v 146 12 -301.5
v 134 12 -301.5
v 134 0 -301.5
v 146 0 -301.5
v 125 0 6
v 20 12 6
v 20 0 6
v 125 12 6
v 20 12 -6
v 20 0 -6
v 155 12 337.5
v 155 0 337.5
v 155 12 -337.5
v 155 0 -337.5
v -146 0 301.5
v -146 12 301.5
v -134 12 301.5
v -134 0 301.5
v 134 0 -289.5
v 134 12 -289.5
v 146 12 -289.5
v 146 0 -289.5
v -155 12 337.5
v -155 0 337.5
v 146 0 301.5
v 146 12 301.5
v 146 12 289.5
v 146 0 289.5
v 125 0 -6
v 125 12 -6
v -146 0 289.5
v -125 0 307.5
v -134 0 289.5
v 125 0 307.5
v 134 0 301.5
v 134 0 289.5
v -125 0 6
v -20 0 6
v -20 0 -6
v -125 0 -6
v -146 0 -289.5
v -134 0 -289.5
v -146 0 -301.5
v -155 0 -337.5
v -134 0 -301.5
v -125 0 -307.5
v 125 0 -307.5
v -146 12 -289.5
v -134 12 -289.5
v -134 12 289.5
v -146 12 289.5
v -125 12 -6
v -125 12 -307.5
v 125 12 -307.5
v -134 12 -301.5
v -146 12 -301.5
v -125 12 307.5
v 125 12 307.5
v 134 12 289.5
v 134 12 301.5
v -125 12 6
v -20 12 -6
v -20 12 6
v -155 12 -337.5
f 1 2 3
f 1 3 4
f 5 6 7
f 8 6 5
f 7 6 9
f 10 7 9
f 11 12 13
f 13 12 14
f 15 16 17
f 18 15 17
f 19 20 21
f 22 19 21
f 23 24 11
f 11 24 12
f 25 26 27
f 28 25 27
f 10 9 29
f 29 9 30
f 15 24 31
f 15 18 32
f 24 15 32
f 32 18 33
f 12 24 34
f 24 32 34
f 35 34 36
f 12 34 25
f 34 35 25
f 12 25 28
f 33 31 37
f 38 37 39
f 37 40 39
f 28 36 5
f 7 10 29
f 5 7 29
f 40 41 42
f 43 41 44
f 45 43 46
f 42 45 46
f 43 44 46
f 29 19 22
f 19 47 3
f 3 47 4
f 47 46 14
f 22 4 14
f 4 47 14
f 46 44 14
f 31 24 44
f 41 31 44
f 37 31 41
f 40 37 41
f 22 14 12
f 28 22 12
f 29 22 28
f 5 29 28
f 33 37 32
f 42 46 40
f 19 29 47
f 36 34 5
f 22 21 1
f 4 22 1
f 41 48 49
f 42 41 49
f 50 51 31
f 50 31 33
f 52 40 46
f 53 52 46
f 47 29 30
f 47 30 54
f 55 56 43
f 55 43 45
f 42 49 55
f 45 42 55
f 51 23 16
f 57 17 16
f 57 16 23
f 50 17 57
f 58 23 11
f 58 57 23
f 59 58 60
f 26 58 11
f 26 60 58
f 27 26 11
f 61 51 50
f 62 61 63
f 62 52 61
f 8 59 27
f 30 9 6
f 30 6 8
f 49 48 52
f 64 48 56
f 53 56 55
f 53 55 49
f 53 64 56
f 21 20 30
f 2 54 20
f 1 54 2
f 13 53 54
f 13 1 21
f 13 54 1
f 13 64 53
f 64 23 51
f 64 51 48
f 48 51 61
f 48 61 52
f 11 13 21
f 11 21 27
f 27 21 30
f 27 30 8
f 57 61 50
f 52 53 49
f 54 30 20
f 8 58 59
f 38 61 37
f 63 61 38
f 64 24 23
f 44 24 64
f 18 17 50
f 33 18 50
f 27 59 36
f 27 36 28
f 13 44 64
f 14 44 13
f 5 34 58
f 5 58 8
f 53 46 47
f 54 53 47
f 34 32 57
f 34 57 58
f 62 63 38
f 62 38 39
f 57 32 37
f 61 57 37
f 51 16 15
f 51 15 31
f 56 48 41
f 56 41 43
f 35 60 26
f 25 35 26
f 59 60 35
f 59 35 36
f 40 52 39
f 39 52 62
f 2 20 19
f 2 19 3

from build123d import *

# Parameters (mm, degrees)
SKETCH1_W               = 310
SKETCH1_H               = 675
SKETCH1_W_2             = 300
SKETCH1_H_2             = 665
SKETCH1_W_3             = 260
SKETCH1_H_3             = 625
SKETCH1_W_4             = 250
SKETCH1_H_4             = 615
BOSS_EXTRUDE1_DEPTH     = 12
SKETCH2_W               = 12
SKETCH2_H               = 12
CUT_EXTRUDE1_DEPTH      = 1
CUT_EXTRUDE1_DEPTH_BACK = 13
SKETCH3_W               = 105
SKETCH3_H               = 12
BOSS_EXTRUDE2_DEPTH     = 12


with BuildPart() as part:
    # Sketch1 → Boss-Extrude1 (new body)
    with BuildSketch(Plane(origin=(0, 0, 0), x_dir=(1, 0, 0), z_dir=(0, 1, 0))):
        Rectangle(SKETCH1_W, SKETCH1_H)
        Rectangle(SKETCH1_W_2, SKETCH1_H_2, mode=Mode.SUBTRACT)
        Rectangle(SKETCH1_W_2, SKETCH1_H_2)
        Rectangle(SKETCH1_W_3, SKETCH1_H_3, mode=Mode.SUBTRACT)
        Rectangle(SKETCH1_W_3, SKETCH1_H_3)
        Rectangle(SKETCH1_W_4, SKETCH1_H_4, mode=Mode.SUBTRACT)
    extrude(amount=BOSS_EXTRUDE1_DEPTH)

    # Sketch2 → Cut-Extrude1 (cut, two sides)
    with BuildSketch(Plane(origin=(0, 12, 0), x_dir=(1, 0, 0), z_dir=(0, 1, 0))) as cut_extrude1_sk:
        with Locations((-140, -295.5)):
            Rectangle(SKETCH2_W, SKETCH2_H)
        with Locations((-140, 295.5)):
            Rectangle(SKETCH2_W, SKETCH2_H)
        with Locations((140, 295.5)):
            Rectangle(SKETCH2_W, SKETCH2_H)
        with Locations((140, -295.5)):
            Rectangle(SKETCH2_W, SKETCH2_H)
    extrude(amount=CUT_EXTRUDE1_DEPTH, mode=Mode.SUBTRACT)
    extrude(cut_extrude1_sk.sketch, amount=-CUT_EXTRUDE1_DEPTH_BACK, mode=Mode.SUBTRACT)

    # Sketch3 → Boss-Extrude2 (add)
    with BuildSketch(Plane(origin=(0, 12, 0), x_dir=(1, 0, 0), z_dir=(0, 1, 0))):
        with Locations((-72.5, 0)):
            Rectangle(SKETCH3_W, SKETCH3_H)
        with Locations((72.5, 0)):
            Rectangle(SKETCH3_W, SKETCH3_H)
    extrude(amount=-BOSS_EXTRUDE2_DEPTH)


solid = part.part
